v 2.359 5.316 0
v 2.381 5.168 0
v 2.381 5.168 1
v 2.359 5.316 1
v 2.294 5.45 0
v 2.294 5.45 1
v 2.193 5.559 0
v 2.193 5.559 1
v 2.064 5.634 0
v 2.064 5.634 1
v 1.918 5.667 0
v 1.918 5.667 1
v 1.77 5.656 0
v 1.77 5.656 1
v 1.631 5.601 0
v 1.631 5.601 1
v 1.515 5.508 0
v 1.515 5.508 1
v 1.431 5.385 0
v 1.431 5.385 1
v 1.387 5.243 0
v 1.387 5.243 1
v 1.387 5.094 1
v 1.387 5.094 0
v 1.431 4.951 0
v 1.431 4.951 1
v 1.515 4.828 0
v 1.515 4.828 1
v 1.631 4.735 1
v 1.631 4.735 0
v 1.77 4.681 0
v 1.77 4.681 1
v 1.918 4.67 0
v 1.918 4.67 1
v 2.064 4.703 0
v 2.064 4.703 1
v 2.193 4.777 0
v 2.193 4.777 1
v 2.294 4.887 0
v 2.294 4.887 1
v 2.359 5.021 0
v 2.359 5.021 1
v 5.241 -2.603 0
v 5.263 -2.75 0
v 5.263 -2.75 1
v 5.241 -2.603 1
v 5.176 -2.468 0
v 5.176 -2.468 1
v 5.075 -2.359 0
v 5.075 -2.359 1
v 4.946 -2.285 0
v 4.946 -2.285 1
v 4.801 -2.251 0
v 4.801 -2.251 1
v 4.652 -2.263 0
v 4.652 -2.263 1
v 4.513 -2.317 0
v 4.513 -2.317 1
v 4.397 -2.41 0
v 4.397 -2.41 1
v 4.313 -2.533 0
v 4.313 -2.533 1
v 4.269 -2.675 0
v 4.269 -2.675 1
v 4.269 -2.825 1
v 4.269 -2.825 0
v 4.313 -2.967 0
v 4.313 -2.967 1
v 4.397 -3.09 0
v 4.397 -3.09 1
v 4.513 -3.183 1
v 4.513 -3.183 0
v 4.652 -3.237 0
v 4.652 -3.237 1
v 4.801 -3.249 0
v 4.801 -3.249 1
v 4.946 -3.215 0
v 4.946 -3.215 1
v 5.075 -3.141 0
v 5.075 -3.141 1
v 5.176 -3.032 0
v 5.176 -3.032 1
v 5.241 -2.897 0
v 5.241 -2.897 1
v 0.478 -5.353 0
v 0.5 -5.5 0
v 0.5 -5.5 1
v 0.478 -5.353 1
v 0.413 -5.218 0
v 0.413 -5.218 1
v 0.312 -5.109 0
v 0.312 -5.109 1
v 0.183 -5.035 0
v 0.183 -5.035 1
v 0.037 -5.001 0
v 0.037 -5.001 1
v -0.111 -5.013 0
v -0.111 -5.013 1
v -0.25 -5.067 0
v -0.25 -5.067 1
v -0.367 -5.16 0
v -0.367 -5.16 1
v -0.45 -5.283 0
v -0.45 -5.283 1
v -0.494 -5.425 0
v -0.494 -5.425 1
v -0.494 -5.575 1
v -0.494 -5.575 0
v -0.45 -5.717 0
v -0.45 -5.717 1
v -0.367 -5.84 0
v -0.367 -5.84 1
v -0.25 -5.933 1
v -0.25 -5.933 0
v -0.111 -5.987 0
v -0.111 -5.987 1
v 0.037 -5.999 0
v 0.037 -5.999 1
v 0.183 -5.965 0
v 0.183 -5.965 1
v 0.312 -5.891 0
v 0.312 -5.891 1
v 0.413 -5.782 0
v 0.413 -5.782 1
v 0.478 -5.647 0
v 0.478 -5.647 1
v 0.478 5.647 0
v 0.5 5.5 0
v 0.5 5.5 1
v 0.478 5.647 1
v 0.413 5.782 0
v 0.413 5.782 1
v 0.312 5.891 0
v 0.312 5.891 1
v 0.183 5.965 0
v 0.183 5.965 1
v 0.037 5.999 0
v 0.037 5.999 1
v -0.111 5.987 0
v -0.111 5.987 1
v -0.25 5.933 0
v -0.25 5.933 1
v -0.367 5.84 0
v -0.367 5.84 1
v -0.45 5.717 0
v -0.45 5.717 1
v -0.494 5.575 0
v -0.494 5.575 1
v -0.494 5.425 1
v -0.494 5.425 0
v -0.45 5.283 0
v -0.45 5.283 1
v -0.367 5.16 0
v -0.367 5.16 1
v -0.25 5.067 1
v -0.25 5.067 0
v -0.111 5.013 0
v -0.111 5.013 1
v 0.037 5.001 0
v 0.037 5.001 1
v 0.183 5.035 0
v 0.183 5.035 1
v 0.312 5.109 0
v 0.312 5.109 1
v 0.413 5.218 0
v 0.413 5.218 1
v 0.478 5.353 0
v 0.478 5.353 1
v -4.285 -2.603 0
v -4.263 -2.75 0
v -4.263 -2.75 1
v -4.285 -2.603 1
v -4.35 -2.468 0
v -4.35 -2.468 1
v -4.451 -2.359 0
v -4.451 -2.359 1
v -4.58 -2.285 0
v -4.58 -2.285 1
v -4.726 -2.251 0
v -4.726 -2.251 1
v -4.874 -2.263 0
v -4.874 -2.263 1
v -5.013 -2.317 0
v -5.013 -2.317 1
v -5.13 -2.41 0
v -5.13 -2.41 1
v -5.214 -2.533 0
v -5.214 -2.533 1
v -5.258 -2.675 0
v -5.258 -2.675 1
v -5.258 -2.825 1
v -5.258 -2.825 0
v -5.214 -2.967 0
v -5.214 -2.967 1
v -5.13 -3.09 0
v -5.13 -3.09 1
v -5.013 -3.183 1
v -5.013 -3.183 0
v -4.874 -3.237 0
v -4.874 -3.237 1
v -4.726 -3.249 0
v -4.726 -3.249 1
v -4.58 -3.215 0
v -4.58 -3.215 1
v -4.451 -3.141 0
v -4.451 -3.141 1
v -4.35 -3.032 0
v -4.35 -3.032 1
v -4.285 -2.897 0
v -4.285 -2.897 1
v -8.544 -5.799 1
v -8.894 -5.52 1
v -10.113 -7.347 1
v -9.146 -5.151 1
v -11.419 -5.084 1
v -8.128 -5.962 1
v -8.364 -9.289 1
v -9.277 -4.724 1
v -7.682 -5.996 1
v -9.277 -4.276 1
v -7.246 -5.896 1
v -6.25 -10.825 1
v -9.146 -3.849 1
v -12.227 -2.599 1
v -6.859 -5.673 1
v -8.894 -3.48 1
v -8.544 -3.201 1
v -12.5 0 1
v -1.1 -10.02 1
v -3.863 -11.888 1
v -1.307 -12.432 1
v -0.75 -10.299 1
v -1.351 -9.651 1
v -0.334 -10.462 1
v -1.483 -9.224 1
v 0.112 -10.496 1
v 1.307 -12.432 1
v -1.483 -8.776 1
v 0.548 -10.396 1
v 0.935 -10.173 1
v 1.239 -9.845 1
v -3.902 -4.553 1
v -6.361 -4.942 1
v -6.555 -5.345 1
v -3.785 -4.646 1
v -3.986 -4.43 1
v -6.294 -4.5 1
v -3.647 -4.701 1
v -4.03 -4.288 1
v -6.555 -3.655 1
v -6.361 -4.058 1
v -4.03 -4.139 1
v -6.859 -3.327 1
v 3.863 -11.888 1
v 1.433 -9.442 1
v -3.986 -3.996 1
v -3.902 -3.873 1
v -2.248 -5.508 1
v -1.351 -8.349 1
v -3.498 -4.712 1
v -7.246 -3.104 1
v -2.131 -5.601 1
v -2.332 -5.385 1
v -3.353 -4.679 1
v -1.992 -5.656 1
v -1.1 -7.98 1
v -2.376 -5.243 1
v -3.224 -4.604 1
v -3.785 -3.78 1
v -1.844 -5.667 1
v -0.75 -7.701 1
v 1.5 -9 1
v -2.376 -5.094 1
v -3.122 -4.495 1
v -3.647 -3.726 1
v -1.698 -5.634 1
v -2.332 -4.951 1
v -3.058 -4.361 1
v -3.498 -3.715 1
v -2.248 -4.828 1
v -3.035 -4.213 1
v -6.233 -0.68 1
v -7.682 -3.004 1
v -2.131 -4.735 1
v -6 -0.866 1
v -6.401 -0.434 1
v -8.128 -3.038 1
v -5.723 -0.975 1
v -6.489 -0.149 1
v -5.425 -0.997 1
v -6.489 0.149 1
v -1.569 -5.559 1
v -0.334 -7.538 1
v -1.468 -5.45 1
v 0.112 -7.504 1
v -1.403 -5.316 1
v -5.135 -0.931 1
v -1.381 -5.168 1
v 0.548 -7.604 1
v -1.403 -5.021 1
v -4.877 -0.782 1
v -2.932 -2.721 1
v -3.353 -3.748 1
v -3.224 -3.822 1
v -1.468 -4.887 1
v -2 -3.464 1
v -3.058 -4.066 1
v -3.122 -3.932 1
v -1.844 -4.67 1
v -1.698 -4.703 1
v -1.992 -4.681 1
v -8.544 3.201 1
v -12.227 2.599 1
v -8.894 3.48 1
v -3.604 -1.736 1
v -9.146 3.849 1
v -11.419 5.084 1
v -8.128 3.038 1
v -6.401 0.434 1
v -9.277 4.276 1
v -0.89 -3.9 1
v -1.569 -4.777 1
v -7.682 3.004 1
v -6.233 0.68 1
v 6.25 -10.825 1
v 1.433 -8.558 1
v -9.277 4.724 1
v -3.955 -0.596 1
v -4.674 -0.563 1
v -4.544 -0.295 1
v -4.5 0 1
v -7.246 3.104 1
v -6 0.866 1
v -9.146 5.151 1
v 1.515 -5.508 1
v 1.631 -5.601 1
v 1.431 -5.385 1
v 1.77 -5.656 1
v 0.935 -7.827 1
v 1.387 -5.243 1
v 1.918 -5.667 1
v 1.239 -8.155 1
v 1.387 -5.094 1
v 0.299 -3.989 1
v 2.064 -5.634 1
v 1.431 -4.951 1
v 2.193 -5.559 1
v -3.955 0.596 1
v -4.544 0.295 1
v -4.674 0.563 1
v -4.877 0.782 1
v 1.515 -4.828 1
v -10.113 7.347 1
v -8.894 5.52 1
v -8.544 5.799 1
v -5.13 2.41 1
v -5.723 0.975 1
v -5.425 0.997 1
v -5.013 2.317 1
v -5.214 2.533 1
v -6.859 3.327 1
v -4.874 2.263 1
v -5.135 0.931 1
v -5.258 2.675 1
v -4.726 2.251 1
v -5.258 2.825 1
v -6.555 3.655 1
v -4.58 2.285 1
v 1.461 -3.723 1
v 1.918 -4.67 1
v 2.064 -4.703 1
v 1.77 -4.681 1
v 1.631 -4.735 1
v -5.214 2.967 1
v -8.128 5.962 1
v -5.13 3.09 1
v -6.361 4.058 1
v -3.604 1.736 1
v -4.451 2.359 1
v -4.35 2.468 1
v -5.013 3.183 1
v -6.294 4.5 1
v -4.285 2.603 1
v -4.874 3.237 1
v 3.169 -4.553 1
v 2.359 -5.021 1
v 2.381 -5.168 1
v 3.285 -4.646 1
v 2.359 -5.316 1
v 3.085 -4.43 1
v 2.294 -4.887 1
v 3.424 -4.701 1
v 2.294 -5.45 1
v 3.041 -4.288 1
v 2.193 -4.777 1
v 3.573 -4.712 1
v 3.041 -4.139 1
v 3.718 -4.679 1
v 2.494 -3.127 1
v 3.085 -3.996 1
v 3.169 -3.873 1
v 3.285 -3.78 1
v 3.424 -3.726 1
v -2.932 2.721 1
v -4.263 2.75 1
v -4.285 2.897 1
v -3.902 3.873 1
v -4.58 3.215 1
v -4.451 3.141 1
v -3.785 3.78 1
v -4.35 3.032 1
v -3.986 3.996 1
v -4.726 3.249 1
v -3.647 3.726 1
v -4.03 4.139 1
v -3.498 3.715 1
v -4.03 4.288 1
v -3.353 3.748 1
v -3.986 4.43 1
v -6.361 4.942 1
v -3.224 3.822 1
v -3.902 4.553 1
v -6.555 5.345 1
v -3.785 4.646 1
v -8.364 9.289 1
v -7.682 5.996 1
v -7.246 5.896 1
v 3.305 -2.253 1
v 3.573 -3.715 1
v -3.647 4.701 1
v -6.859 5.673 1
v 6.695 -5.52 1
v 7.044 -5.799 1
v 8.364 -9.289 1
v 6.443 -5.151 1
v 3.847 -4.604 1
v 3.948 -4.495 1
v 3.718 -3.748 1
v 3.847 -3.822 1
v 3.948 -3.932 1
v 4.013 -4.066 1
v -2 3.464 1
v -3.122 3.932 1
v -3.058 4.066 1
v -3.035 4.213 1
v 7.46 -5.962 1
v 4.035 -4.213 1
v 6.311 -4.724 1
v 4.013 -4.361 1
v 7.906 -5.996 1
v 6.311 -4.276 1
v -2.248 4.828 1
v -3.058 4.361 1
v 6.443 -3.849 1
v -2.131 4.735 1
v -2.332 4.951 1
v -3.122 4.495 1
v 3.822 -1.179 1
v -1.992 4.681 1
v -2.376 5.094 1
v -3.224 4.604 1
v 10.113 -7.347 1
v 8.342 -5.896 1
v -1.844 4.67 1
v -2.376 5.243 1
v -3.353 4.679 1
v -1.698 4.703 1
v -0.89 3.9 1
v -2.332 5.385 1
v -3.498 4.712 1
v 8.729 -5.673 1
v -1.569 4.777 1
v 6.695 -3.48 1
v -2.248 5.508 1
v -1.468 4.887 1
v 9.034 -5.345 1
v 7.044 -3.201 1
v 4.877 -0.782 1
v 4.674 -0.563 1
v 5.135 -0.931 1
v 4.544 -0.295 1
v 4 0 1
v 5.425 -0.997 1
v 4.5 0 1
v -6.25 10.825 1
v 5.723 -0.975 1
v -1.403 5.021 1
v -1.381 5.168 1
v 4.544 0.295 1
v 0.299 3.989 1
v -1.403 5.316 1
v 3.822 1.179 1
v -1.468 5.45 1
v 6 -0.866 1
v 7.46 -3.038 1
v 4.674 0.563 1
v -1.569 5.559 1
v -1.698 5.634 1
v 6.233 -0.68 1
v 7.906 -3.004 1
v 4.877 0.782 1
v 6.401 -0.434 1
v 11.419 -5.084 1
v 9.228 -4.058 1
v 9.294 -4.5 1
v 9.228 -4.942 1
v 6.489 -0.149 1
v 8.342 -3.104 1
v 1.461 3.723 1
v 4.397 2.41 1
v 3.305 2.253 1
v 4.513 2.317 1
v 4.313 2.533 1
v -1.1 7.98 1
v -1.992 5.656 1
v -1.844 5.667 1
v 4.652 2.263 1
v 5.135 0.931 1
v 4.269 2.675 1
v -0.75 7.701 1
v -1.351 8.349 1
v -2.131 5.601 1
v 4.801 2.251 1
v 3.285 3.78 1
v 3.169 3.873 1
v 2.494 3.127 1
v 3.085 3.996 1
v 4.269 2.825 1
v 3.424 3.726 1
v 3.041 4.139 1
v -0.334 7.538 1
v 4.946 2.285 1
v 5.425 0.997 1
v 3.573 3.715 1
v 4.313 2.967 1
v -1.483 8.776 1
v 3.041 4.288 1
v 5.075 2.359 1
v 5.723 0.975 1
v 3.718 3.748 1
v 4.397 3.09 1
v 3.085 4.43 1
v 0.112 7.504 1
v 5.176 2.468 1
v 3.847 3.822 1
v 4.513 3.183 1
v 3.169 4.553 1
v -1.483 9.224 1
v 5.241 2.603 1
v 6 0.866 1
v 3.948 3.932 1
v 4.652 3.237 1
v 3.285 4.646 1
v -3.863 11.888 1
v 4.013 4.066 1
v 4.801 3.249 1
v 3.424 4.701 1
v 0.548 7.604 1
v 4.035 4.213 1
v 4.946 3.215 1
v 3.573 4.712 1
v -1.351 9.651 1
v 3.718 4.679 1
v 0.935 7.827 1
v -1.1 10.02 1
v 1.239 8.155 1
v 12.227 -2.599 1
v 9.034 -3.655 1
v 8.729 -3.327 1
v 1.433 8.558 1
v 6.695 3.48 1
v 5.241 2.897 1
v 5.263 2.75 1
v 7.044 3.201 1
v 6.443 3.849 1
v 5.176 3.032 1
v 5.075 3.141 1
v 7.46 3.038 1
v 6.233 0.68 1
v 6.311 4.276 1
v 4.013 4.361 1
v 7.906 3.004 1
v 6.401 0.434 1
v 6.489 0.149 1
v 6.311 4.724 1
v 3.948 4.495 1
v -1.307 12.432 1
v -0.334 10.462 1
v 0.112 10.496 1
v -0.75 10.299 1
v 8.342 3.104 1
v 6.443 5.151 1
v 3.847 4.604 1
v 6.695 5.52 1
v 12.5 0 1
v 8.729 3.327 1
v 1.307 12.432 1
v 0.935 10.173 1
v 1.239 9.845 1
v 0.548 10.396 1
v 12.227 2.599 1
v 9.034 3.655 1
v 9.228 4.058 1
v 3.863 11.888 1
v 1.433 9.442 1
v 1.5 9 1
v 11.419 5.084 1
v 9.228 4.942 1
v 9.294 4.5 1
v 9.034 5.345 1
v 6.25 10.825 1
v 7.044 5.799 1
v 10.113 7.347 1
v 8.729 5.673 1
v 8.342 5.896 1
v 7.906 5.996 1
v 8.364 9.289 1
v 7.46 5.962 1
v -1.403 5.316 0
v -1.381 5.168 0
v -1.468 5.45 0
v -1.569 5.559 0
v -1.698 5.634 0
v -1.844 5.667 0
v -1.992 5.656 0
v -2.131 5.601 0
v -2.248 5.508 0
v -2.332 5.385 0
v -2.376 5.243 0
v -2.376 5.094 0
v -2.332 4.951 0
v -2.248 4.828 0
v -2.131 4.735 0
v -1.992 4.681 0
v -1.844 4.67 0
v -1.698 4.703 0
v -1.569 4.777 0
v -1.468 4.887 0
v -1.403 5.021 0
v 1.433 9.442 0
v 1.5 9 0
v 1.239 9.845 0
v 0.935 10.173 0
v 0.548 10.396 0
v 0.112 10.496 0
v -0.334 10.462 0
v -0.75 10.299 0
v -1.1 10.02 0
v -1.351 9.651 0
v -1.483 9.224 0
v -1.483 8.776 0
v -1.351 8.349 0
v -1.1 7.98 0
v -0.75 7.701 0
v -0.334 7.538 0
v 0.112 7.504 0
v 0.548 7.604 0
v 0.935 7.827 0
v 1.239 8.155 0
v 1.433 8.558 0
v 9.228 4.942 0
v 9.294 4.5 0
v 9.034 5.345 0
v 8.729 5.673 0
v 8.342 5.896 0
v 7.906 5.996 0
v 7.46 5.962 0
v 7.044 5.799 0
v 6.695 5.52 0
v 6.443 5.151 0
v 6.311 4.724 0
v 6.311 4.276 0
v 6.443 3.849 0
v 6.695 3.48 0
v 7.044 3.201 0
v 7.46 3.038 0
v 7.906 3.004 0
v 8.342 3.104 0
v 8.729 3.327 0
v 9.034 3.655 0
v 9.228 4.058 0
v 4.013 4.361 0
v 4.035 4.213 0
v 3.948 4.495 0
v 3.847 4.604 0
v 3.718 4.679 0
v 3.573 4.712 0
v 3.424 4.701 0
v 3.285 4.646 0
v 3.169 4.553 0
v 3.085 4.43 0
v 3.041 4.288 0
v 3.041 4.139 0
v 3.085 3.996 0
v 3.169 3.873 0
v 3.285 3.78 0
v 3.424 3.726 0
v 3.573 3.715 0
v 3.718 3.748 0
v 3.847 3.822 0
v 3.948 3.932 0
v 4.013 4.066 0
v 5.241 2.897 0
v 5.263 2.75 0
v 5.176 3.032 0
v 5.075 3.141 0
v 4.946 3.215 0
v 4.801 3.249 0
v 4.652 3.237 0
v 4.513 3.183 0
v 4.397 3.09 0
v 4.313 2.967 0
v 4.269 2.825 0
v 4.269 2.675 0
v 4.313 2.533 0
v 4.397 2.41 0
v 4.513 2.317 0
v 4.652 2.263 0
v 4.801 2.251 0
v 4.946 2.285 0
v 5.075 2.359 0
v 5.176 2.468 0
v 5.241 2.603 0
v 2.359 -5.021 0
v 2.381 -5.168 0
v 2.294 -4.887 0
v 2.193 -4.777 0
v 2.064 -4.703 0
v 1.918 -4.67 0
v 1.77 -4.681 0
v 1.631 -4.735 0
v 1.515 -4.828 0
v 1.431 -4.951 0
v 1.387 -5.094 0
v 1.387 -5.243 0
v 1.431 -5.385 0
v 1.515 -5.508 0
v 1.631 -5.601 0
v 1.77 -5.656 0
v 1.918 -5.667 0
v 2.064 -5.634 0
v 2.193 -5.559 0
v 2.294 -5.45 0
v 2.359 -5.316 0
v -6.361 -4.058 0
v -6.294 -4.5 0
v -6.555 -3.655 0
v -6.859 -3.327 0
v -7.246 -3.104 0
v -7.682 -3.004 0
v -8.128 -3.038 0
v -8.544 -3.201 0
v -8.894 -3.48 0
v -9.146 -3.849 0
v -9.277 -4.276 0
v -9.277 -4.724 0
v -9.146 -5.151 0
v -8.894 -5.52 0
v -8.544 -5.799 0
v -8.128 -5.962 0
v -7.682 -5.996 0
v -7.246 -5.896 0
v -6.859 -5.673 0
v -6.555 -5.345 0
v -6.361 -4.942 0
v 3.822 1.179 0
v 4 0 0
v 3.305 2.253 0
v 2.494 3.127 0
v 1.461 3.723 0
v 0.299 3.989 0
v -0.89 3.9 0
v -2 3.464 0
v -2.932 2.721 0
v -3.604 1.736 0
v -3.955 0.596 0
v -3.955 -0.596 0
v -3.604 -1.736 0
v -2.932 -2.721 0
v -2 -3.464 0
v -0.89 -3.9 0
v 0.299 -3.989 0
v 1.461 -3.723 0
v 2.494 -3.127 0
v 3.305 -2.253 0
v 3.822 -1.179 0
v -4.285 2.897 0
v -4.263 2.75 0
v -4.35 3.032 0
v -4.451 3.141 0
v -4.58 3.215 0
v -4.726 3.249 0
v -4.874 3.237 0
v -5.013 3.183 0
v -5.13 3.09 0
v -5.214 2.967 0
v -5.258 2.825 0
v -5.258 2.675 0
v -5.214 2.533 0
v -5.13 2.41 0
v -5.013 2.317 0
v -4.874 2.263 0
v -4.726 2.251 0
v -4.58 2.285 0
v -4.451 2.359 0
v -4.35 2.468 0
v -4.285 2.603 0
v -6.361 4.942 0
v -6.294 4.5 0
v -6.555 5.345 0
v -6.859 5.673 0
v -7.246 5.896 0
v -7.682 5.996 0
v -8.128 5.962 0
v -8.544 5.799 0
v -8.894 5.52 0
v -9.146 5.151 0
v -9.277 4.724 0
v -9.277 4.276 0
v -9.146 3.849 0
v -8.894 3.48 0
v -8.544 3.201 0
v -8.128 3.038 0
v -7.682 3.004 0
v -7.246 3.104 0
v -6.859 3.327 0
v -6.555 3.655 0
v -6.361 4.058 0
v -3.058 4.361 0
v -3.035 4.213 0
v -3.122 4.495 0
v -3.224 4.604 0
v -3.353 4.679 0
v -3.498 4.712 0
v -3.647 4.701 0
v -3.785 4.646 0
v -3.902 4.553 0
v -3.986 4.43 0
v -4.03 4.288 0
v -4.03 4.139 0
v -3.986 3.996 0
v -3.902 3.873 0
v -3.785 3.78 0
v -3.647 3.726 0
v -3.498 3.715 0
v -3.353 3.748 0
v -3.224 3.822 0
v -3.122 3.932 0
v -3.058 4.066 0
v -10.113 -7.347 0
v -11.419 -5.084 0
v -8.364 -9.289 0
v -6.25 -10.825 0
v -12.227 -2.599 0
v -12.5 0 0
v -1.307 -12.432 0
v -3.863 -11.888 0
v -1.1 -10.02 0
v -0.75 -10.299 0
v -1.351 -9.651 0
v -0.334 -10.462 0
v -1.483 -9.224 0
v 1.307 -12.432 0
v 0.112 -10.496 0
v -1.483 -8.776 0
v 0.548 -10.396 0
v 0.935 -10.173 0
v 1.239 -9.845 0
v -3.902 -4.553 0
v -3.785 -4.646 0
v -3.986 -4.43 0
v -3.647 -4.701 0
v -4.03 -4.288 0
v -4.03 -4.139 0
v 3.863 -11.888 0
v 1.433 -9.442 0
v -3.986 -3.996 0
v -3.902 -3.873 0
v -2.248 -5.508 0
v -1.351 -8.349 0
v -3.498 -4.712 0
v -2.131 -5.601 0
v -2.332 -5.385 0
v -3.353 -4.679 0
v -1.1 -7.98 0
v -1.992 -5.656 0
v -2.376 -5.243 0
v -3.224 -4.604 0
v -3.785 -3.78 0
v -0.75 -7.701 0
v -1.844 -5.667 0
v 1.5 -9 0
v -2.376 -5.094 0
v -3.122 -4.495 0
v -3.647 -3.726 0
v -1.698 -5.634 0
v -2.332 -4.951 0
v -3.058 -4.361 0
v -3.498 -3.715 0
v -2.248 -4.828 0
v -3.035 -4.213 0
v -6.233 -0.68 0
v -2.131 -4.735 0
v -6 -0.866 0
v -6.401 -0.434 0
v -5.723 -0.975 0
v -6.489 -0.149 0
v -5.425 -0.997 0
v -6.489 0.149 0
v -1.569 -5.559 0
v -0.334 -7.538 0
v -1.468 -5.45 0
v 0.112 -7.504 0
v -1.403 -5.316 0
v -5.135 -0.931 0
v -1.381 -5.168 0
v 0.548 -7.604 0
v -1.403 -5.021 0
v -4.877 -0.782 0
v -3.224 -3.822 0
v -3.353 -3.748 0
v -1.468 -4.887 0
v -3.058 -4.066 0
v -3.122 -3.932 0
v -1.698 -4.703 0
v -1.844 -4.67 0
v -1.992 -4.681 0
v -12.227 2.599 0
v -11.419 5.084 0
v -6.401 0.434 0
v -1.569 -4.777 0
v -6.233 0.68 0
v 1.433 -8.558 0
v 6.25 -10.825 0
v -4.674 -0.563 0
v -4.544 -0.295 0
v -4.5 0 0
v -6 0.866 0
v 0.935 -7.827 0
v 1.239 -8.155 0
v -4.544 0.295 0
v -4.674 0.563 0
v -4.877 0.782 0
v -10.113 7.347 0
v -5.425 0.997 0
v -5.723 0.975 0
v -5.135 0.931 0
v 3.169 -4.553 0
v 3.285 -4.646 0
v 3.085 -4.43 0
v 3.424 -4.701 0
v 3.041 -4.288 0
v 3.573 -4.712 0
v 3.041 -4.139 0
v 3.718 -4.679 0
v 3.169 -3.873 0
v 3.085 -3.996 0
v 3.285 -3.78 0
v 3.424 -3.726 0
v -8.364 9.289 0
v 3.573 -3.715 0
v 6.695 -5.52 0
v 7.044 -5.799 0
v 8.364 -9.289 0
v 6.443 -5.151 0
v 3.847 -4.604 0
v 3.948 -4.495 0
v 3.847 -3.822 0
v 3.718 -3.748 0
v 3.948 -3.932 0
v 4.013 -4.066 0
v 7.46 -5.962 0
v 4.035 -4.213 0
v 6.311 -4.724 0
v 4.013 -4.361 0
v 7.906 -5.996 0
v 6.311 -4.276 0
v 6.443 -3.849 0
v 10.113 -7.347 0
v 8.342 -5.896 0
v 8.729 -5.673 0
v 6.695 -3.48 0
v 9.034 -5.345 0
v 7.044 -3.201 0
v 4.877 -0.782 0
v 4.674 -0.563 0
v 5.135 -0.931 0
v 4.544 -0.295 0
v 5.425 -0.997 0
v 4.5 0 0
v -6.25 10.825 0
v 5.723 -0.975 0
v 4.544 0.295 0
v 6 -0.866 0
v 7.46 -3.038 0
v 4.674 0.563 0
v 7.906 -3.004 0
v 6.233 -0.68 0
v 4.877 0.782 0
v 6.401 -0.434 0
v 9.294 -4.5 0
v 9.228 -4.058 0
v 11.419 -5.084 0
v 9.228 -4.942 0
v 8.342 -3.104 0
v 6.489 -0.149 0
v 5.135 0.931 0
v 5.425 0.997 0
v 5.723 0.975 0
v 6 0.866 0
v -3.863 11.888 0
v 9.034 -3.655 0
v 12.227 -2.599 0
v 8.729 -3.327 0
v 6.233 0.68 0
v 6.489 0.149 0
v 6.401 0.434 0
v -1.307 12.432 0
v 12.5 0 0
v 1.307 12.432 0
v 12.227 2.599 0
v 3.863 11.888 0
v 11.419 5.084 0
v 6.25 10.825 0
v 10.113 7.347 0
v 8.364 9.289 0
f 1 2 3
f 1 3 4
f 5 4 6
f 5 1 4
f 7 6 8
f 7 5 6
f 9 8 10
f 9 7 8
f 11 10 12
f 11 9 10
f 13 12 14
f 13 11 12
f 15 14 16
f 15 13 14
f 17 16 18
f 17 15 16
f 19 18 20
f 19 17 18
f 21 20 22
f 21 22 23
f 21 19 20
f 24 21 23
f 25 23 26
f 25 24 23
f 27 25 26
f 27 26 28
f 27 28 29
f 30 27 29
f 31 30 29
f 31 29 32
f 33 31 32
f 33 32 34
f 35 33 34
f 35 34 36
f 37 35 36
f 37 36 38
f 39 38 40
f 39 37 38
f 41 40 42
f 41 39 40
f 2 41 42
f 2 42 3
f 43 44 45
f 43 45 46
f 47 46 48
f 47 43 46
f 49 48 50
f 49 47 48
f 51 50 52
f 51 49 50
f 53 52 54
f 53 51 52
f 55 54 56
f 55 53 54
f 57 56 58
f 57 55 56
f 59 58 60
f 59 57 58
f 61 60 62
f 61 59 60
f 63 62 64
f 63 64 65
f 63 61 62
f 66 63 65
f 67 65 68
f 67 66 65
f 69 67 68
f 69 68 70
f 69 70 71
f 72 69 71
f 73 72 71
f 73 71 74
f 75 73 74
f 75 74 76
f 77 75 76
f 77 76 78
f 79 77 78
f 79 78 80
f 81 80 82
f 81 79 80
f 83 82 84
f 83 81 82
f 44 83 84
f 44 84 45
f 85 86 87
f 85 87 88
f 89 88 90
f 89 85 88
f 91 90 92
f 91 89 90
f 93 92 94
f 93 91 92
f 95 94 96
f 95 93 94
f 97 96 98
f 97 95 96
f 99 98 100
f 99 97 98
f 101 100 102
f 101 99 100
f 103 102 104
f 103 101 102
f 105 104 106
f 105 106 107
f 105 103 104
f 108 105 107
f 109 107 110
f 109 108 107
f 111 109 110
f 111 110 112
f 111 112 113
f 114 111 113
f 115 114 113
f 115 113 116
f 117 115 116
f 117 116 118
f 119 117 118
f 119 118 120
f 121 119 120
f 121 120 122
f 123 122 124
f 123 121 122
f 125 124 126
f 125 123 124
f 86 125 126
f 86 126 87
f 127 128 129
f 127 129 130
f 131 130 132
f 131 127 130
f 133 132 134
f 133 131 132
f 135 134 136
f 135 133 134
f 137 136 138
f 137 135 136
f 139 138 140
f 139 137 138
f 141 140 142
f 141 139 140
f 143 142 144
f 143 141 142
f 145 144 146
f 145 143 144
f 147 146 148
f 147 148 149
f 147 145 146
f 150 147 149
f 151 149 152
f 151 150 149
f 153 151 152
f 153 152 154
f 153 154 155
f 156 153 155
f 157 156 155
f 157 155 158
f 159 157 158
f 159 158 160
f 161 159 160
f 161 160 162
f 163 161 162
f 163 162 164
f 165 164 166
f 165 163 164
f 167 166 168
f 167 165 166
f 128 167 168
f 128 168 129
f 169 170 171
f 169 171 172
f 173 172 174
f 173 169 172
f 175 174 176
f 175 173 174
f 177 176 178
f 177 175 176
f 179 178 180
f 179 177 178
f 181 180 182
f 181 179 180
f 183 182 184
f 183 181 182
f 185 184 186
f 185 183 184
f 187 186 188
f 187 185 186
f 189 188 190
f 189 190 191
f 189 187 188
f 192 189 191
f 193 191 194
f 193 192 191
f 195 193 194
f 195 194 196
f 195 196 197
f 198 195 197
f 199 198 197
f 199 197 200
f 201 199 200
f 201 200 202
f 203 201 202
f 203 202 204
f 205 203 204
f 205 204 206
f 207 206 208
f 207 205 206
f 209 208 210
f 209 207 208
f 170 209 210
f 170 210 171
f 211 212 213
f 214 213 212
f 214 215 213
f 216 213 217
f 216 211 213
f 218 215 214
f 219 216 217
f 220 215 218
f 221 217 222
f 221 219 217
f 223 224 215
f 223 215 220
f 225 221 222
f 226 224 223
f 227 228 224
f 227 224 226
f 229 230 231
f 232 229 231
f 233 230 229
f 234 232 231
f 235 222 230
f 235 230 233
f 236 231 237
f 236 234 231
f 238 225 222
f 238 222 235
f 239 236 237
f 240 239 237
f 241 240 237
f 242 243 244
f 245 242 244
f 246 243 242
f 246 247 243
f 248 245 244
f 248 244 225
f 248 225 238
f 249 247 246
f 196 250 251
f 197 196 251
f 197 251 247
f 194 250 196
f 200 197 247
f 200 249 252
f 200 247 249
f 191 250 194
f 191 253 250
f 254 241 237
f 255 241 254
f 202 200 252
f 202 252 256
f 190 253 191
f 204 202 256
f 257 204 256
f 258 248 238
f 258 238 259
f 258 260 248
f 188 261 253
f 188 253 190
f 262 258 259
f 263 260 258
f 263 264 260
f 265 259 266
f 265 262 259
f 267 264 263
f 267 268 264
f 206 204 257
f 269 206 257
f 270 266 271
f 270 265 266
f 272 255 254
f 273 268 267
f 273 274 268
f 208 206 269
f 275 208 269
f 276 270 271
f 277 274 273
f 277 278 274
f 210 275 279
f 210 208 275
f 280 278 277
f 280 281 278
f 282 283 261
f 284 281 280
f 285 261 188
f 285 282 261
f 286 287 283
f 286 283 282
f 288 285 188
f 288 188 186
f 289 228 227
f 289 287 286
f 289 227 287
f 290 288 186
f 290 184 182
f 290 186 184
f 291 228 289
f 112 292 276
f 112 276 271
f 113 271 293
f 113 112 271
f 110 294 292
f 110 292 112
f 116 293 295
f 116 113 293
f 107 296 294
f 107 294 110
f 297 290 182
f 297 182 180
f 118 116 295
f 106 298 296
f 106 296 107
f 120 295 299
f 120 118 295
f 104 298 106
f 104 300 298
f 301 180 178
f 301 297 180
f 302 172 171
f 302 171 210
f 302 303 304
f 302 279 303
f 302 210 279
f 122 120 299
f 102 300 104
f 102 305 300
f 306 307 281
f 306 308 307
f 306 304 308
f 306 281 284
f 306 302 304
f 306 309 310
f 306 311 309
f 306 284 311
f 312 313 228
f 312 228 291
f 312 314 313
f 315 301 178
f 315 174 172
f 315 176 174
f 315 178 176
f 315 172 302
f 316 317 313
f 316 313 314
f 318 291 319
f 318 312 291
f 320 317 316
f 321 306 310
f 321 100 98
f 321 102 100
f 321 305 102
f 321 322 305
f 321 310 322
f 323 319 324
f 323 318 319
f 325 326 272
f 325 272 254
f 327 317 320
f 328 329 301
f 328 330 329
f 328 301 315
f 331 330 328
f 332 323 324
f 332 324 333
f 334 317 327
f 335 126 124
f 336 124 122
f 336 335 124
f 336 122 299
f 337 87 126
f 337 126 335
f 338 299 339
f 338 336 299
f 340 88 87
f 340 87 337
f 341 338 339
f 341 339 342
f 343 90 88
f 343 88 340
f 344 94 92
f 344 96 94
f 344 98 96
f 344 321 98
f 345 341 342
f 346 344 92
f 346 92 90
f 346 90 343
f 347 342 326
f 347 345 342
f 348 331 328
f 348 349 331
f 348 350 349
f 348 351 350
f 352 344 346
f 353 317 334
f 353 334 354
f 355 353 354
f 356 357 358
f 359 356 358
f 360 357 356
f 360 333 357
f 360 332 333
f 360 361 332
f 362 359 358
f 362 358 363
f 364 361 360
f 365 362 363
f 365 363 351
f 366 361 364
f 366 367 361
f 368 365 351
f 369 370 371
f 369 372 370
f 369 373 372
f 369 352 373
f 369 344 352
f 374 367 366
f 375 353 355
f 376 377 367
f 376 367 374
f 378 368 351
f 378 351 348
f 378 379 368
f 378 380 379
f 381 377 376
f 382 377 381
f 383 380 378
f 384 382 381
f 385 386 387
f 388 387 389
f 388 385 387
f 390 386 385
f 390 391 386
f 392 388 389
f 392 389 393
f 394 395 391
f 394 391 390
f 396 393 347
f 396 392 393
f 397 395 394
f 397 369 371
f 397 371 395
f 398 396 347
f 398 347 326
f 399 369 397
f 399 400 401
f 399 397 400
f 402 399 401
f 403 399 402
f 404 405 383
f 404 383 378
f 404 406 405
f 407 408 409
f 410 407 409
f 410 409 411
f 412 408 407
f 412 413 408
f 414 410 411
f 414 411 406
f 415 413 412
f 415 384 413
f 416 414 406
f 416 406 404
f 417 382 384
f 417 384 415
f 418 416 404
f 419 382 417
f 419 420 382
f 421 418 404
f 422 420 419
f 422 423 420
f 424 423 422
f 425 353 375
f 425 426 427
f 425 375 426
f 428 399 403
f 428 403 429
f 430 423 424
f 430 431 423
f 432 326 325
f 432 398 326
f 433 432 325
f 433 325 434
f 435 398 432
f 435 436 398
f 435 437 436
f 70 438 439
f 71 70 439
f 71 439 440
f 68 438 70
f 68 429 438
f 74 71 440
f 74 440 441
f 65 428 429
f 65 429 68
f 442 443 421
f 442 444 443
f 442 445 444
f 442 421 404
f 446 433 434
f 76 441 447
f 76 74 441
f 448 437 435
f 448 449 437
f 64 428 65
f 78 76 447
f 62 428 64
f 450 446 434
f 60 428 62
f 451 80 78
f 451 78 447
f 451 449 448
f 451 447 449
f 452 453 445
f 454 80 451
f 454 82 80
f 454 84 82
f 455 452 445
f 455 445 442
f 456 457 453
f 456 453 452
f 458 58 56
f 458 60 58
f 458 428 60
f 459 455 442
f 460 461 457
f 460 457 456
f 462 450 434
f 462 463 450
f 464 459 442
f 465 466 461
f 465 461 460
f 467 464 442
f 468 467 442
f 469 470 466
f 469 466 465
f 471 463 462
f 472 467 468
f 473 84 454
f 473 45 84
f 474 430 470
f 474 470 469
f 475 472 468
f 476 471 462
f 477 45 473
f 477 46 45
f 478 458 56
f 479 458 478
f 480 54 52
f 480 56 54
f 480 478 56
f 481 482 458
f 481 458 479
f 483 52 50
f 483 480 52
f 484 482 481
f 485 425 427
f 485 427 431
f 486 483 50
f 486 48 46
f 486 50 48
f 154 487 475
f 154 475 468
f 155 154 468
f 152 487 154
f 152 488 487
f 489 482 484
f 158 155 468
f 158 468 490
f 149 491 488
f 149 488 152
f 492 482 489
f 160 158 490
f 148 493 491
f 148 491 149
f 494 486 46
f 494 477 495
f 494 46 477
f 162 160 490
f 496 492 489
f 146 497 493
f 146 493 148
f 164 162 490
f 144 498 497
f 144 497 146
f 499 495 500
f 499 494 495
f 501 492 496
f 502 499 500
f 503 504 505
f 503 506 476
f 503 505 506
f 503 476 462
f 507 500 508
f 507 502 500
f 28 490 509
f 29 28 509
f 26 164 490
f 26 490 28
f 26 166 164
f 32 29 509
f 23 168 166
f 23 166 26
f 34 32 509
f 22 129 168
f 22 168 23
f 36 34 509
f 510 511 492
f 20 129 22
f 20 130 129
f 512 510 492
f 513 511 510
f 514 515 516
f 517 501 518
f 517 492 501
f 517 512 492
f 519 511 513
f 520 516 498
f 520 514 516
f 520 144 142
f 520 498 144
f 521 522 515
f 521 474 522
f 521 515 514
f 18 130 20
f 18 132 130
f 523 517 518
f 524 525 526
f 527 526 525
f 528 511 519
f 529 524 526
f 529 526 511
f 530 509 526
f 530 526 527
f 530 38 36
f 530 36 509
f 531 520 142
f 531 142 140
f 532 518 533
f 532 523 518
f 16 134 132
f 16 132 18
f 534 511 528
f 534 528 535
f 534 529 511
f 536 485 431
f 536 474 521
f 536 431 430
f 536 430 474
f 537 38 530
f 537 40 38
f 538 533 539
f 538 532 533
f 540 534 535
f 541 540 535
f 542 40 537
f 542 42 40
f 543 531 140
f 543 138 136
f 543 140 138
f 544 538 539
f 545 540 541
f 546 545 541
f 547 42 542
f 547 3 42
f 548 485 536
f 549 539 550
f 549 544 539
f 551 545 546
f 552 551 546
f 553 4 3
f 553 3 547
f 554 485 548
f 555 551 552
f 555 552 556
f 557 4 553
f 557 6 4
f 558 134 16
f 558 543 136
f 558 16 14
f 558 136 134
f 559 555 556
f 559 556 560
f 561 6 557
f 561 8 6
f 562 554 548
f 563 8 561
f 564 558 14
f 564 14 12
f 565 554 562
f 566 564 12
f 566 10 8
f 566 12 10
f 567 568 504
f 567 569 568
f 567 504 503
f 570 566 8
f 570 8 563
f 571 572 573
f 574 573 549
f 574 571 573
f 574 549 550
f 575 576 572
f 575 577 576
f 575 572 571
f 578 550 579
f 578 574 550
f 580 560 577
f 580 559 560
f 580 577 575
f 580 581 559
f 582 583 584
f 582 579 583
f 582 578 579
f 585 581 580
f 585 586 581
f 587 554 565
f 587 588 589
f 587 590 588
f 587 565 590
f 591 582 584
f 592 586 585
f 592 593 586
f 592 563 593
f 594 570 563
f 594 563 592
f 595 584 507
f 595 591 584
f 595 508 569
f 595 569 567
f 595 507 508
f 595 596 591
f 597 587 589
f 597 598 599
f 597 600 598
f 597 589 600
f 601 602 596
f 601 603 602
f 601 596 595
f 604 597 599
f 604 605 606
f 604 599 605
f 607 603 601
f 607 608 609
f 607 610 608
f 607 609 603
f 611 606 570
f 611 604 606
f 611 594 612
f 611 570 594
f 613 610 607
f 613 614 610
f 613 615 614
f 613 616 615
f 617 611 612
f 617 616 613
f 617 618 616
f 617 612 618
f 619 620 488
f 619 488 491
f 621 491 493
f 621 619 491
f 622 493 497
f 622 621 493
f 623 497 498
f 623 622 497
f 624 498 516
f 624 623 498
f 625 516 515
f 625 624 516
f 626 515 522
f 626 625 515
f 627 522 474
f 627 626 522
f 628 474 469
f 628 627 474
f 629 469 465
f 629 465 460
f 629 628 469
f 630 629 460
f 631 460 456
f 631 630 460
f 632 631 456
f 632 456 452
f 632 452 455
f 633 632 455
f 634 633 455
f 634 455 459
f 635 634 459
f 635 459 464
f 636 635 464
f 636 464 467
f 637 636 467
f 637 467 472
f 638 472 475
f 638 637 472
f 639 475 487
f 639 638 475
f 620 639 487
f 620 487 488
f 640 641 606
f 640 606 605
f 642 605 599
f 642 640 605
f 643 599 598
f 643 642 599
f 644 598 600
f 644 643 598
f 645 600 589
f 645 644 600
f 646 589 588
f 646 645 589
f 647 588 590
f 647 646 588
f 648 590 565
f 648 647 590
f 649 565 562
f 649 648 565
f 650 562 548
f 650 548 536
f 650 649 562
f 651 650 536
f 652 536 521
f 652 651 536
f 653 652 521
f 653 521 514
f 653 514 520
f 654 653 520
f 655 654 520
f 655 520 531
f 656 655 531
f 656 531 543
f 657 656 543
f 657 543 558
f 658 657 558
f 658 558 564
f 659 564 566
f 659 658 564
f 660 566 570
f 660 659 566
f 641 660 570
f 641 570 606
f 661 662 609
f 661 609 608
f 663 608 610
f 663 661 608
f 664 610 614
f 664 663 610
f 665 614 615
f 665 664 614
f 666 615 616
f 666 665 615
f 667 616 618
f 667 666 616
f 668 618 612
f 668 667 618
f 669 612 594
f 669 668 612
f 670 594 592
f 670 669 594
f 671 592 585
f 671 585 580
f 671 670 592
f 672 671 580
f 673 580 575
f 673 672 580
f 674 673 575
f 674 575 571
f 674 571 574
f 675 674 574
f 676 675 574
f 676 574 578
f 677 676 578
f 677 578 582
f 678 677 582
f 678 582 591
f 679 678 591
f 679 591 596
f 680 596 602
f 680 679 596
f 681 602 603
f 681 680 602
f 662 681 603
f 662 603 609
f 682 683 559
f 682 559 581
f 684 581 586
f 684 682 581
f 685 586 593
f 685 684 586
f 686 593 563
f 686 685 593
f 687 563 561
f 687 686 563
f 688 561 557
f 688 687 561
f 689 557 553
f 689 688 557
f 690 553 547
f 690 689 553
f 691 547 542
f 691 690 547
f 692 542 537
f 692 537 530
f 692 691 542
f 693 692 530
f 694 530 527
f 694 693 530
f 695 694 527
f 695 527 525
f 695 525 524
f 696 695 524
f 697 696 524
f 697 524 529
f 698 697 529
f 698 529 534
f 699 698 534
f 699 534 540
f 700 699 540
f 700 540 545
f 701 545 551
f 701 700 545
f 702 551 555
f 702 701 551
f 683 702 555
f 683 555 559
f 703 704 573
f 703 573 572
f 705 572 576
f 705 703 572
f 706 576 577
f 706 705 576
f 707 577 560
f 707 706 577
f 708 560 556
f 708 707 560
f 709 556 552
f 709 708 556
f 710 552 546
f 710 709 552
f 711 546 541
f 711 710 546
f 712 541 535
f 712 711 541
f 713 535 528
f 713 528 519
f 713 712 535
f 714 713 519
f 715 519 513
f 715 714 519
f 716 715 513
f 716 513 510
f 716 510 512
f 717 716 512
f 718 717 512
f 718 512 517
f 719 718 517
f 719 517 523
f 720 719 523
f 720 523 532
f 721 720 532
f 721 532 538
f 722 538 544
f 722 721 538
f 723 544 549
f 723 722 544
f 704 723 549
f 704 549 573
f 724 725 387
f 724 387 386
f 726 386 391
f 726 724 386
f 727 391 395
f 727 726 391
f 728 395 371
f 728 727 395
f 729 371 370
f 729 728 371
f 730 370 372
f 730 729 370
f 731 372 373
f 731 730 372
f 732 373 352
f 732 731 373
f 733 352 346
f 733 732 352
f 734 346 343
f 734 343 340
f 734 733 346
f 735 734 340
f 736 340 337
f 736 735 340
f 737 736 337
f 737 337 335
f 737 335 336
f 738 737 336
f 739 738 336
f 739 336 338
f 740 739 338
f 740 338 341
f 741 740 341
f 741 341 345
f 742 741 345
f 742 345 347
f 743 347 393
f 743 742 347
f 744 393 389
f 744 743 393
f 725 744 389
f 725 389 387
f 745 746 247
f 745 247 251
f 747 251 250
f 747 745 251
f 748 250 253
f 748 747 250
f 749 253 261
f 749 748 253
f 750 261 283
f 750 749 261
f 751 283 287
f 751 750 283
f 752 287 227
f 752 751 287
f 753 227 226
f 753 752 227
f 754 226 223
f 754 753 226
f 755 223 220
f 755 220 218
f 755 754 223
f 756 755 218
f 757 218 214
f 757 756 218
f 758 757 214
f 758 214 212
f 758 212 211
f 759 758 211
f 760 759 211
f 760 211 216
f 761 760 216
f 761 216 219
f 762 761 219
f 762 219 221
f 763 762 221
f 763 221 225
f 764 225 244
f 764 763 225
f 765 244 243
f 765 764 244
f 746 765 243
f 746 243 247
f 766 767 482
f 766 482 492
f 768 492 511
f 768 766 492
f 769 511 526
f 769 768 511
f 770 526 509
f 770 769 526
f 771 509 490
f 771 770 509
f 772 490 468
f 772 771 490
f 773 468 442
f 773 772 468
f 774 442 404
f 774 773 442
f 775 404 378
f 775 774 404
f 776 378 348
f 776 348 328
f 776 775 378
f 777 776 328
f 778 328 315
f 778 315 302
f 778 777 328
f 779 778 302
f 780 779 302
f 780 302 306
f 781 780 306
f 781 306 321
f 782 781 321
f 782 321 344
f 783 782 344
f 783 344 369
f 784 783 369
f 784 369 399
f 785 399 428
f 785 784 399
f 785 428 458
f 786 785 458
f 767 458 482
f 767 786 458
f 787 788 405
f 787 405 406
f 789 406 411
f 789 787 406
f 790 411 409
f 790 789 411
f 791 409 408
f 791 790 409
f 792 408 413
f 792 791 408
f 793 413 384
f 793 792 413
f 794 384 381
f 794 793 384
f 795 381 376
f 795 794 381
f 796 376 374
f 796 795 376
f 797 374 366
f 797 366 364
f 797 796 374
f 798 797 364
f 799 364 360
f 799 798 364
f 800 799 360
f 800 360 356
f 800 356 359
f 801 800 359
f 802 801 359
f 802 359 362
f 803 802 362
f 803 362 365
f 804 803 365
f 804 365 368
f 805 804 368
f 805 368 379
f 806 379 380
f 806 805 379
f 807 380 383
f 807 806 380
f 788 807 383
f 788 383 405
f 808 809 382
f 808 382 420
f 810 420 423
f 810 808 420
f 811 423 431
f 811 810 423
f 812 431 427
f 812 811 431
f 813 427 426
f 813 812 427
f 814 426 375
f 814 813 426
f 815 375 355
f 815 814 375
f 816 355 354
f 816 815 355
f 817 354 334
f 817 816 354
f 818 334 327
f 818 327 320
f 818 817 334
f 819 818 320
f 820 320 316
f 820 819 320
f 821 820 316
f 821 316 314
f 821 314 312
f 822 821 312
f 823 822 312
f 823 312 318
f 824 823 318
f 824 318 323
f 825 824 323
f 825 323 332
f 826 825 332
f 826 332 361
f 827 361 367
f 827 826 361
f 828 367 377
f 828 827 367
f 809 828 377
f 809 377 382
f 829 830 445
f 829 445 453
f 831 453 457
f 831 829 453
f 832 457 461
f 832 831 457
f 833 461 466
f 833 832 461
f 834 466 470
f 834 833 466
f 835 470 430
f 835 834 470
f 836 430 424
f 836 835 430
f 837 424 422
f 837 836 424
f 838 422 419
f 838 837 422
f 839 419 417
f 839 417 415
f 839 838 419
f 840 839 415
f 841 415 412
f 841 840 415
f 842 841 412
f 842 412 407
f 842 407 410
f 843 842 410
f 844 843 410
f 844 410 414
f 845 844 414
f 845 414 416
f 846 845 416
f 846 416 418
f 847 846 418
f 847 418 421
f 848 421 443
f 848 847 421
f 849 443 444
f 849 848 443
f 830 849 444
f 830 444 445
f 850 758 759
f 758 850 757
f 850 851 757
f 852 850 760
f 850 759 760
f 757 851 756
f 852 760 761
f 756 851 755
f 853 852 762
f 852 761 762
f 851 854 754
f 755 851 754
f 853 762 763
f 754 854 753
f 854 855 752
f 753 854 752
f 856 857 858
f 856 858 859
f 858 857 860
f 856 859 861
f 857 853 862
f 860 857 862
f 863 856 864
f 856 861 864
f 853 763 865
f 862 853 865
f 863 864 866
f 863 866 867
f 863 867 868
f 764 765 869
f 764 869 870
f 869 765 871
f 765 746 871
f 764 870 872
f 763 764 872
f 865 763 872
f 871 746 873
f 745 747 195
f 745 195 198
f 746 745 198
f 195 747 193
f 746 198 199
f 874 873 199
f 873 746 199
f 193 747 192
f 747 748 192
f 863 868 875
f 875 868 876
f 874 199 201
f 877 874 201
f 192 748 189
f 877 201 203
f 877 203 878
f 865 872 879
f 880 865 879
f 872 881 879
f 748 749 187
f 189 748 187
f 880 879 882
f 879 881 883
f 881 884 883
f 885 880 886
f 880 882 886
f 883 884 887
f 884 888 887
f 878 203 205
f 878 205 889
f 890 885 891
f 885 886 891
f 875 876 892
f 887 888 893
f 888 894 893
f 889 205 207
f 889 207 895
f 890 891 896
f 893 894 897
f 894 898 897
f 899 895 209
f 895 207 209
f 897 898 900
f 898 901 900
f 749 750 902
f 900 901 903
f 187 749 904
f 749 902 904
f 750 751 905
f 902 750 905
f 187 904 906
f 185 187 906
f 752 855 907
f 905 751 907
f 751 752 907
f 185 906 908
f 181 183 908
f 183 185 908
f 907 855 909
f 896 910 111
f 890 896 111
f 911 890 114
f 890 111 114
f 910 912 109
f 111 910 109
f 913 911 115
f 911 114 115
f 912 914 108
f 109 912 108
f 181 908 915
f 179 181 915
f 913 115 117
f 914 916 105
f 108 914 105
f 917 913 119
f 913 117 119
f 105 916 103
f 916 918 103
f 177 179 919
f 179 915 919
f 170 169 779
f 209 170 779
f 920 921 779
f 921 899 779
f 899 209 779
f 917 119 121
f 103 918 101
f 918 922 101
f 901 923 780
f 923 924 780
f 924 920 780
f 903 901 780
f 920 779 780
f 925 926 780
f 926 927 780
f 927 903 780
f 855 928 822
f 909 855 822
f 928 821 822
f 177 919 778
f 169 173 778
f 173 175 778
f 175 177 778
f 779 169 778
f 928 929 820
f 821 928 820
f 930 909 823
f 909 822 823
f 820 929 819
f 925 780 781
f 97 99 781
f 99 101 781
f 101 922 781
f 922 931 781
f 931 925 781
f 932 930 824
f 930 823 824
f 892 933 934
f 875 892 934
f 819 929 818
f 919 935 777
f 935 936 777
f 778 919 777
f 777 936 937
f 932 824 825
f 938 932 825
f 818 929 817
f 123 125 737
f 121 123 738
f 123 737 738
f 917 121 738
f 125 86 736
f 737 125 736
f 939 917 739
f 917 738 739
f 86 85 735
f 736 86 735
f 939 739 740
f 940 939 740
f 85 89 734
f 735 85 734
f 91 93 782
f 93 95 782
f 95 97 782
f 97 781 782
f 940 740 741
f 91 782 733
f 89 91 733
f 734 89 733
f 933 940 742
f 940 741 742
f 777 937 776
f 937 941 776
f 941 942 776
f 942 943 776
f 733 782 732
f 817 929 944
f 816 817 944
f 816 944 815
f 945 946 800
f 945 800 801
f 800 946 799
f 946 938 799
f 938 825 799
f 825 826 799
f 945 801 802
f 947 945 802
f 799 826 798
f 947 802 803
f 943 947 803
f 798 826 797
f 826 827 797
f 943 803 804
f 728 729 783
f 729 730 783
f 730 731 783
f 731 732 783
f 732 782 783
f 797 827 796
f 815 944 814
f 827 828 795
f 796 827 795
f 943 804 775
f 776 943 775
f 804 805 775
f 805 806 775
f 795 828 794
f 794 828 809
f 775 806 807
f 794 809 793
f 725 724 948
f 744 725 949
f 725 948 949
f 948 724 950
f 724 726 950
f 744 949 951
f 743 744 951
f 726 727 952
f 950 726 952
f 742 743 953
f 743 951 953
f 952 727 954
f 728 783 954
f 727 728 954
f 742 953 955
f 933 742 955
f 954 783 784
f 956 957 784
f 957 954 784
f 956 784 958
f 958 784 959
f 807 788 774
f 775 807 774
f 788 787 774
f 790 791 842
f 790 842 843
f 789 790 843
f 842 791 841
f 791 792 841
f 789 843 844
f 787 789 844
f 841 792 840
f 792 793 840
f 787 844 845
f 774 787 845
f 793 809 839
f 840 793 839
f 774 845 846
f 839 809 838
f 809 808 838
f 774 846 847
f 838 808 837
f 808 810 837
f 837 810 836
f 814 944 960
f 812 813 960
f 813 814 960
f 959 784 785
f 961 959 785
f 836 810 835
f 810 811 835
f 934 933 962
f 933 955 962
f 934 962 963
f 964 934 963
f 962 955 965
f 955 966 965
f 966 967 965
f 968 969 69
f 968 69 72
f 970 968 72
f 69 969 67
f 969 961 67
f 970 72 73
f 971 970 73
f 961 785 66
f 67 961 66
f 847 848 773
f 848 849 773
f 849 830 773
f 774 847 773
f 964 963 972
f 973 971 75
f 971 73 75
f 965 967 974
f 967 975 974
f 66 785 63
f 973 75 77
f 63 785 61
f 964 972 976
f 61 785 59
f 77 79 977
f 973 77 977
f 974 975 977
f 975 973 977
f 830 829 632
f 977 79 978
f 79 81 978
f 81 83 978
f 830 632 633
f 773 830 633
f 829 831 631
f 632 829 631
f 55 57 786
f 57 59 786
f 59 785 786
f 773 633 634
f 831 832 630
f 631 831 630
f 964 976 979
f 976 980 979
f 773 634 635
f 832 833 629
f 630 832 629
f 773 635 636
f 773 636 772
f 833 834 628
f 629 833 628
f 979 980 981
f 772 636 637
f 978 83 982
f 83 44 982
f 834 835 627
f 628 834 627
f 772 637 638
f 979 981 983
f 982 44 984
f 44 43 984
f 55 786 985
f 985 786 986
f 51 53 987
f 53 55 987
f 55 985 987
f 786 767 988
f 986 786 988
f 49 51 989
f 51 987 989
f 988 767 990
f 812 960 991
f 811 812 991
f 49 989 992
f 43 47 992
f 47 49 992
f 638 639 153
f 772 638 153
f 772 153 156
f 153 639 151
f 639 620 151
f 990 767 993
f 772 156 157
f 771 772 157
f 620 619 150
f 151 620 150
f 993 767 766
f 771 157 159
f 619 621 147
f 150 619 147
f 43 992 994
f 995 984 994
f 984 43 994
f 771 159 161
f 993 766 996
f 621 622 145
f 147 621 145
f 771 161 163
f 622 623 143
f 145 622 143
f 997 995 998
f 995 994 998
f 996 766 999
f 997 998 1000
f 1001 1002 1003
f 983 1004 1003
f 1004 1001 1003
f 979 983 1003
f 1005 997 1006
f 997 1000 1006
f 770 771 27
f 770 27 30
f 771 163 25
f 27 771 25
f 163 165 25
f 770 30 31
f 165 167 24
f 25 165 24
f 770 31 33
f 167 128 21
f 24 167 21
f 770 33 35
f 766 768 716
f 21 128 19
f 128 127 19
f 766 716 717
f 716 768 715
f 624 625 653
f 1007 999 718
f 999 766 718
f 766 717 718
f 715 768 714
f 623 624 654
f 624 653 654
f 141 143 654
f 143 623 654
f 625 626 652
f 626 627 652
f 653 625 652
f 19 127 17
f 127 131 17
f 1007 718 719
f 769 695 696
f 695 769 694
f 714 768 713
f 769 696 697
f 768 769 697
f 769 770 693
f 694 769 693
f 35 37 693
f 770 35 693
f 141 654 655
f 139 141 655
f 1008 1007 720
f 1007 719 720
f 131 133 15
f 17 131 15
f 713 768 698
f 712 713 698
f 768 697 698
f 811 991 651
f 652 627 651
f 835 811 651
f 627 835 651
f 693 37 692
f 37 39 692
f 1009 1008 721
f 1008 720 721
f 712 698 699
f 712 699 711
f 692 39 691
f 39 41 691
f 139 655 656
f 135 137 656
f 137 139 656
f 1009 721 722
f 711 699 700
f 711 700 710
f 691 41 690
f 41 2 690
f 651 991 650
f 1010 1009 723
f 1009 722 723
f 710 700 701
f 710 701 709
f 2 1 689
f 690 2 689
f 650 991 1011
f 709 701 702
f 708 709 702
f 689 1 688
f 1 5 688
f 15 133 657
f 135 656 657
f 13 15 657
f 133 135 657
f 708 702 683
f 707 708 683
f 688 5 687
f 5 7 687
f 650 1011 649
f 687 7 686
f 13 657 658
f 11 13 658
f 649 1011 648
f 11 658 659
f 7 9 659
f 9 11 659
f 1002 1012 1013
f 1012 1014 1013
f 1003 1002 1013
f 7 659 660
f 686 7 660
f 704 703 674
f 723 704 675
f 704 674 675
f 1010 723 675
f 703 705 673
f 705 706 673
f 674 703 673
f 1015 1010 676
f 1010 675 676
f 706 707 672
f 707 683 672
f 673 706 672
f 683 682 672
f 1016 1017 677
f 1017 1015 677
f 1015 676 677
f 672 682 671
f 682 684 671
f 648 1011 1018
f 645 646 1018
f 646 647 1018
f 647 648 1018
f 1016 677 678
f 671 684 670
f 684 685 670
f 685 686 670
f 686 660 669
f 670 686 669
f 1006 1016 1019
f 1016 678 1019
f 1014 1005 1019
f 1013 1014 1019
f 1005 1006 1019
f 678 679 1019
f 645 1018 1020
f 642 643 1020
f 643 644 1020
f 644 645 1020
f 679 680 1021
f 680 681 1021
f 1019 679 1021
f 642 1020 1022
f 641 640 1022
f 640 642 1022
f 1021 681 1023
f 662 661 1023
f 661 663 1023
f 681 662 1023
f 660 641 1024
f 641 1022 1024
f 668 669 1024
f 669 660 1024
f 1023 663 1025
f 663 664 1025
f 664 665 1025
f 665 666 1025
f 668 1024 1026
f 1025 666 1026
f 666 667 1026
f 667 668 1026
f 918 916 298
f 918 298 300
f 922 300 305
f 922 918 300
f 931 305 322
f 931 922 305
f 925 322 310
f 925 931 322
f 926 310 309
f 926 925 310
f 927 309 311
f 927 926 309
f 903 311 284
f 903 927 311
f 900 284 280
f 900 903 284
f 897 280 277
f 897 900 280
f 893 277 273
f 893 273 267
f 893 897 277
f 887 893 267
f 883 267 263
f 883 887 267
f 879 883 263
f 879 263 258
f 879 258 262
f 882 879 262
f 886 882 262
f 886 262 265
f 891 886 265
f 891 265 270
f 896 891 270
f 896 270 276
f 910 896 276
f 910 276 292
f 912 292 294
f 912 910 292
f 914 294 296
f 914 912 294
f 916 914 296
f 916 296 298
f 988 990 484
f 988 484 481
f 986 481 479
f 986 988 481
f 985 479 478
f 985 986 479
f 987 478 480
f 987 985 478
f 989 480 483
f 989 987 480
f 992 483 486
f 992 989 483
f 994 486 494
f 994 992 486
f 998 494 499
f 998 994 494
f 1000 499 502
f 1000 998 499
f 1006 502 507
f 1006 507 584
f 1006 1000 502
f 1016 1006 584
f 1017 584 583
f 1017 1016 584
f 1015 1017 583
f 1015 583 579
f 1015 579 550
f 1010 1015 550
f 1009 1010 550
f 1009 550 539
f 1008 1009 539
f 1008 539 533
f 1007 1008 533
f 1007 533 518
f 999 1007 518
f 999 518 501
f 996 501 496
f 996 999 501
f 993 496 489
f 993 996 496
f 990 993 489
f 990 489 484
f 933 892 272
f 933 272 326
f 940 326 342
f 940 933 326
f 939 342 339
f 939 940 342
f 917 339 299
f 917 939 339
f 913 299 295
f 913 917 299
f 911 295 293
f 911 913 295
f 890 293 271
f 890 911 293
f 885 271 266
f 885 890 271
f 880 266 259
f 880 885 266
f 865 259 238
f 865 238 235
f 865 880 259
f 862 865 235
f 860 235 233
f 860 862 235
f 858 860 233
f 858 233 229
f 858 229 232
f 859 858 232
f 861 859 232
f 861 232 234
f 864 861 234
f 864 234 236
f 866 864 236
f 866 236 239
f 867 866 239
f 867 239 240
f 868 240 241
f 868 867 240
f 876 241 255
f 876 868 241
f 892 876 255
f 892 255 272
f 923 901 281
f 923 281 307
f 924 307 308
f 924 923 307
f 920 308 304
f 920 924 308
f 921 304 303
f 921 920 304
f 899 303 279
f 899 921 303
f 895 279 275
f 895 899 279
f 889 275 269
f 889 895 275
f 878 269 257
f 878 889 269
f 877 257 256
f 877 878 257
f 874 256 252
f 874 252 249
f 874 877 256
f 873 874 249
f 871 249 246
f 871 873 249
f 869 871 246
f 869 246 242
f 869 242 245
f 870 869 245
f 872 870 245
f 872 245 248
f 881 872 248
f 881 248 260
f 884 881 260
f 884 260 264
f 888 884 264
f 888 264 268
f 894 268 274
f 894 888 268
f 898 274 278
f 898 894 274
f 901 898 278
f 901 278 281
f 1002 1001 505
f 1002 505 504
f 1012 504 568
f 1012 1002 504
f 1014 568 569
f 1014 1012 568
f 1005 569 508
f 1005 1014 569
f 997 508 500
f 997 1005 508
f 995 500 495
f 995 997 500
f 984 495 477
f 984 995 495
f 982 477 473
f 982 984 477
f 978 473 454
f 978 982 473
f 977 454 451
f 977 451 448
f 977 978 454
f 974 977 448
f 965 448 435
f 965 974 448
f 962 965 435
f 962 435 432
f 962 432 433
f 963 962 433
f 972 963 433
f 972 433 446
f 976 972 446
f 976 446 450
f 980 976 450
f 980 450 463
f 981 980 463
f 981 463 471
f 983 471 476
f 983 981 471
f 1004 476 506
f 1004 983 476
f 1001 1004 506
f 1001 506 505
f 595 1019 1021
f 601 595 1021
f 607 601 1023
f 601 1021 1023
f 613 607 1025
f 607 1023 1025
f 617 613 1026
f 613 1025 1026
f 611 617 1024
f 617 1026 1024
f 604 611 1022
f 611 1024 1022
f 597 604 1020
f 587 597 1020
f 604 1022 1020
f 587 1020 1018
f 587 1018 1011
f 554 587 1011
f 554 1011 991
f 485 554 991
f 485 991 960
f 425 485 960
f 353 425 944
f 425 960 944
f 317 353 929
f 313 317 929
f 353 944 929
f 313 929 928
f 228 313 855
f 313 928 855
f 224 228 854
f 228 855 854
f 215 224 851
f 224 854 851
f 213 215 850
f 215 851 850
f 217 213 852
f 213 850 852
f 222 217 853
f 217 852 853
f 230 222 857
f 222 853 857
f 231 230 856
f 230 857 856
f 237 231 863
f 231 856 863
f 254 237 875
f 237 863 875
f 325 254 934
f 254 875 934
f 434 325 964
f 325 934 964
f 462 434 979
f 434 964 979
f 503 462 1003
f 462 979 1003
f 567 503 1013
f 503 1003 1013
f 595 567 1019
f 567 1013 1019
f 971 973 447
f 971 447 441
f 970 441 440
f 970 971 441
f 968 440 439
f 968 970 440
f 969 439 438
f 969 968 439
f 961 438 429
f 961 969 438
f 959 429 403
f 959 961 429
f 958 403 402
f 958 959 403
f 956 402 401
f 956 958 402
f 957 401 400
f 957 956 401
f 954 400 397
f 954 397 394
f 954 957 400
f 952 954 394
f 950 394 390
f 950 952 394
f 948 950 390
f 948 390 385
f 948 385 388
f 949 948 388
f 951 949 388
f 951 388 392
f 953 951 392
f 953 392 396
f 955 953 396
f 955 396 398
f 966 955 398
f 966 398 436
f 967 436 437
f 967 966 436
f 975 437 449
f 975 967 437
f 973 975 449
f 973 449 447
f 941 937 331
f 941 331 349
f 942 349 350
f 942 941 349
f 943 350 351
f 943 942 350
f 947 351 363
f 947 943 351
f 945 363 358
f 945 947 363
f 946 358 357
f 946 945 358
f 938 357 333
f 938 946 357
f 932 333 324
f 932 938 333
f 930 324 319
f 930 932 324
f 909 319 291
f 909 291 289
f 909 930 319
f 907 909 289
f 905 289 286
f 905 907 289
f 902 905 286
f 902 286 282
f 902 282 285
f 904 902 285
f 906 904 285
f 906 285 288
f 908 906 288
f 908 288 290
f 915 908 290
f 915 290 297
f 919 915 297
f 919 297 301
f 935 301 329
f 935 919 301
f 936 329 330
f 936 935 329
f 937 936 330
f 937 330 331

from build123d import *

# Parameters (mm, degrees)
SKETCH_1_R      = 12.5
SKETCH_1_R_2    = 4
SKETCH_1_R_3    = 1.5
SKETCH_1_R_4    = 1
SKETCH_1_R_5    = 0.5
EXTRUDE_1_DEPTH = 1


with BuildPart() as part:
    # Эскиз1 → Бобышка-Вытянуть1 (new body)
    with BuildSketch(Plane.XY):
        Circle(SKETCH_1_R)
        Circle(SKETCH_1_R_2, mode=Mode.SUBTRACT)
        with Locations((0, 9)):
            Circle(SKETCH_1_R_3, mode=Mode.SUBTRACT)
        with Locations((7.794228634, 4.5)):
            Circle(SKETCH_1_R_3, mode=Mode.SUBTRACT)
        with Locations((7.794228634, -4.5)):
            Circle(SKETCH_1_R_3, mode=Mode.SUBTRACT)
        with Locations((0, -9)):
            Circle(SKETCH_1_R_3, mode=Mode.SUBTRACT)
        with Locations((-7.794228634, -4.5)):
            Circle(SKETCH_1_R_3, mode=Mode.SUBTRACT)
        with Locations((-7.794228634, 4.5)):
            Circle(SKETCH_1_R_3, mode=Mode.SUBTRACT)
        with Locations((-5.5, 0)):
            Circle(SKETCH_1_R_4, mode=Mode.SUBTRACT)
        with Locations(Location((5.5, 0, 0), (0, 0, 180))):
            Circle(SKETCH_1_R_4, mode=Mode.SUBTRACT)
        with Locations((0, 5.5)):
            Circle(SKETCH_1_R_5, mode=Mode.SUBTRACT)
        with Locations((1.881110788, 5.168309414)):
            Circle(SKETCH_1_R_5, mode=Mode.SUBTRACT)
        with Locations((3.535331853, 4.213244437)):
            Circle(SKETCH_1_R_5, mode=Mode.SUBTRACT)
        with Locations((4.763139721, 2.75)):
            Circle(SKETCH_1_R_5, mode=Mode.SUBTRACT)
        with Locations((4.763139721, -2.75)):
            Circle(SKETCH_1_R_5, mode=Mode.SUBTRACT)
        with Locations((3.535331853, -4.213244437)):
            Circle(SKETCH_1_R_5, mode=Mode.SUBTRACT)
        with Locations((1.881110788, -5.168309414)):
            Circle(SKETCH_1_R_5, mode=Mode.SUBTRACT)
        with Locations((0, -5.5)):
            Circle(SKETCH_1_R_5, mode=Mode.SUBTRACT)
        with Locations((-1.881110788, -5.168309414)):
            Circle(SKETCH_1_R_5, mode=Mode.SUBTRACT)
        with Locations((-3.535331853, -4.213244437)):
            Circle(SKETCH_1_R_5, mode=Mode.SUBTRACT)
        with Locations((-4.763139721, -2.75)):
            Circle(SKETCH_1_R_5, mode=Mode.SUBTRACT)
        with Locations((-4.763139721, 2.75)):
            Circle(SKETCH_1_R_5, mode=Mode.SUBTRACT)
        with Locations((-3.535331853, 4.213244437)):
            Circle(SKETCH_1_R_5, mode=Mode.SUBTRACT)
        with Locations((-1.881110788, 5.168309414)):
            Circle(SKETCH_1_R_5, mode=Mode.SUBTRACT)
    extrude(amount=EXTRUDE_1_DEPTH)


solid = part.part
